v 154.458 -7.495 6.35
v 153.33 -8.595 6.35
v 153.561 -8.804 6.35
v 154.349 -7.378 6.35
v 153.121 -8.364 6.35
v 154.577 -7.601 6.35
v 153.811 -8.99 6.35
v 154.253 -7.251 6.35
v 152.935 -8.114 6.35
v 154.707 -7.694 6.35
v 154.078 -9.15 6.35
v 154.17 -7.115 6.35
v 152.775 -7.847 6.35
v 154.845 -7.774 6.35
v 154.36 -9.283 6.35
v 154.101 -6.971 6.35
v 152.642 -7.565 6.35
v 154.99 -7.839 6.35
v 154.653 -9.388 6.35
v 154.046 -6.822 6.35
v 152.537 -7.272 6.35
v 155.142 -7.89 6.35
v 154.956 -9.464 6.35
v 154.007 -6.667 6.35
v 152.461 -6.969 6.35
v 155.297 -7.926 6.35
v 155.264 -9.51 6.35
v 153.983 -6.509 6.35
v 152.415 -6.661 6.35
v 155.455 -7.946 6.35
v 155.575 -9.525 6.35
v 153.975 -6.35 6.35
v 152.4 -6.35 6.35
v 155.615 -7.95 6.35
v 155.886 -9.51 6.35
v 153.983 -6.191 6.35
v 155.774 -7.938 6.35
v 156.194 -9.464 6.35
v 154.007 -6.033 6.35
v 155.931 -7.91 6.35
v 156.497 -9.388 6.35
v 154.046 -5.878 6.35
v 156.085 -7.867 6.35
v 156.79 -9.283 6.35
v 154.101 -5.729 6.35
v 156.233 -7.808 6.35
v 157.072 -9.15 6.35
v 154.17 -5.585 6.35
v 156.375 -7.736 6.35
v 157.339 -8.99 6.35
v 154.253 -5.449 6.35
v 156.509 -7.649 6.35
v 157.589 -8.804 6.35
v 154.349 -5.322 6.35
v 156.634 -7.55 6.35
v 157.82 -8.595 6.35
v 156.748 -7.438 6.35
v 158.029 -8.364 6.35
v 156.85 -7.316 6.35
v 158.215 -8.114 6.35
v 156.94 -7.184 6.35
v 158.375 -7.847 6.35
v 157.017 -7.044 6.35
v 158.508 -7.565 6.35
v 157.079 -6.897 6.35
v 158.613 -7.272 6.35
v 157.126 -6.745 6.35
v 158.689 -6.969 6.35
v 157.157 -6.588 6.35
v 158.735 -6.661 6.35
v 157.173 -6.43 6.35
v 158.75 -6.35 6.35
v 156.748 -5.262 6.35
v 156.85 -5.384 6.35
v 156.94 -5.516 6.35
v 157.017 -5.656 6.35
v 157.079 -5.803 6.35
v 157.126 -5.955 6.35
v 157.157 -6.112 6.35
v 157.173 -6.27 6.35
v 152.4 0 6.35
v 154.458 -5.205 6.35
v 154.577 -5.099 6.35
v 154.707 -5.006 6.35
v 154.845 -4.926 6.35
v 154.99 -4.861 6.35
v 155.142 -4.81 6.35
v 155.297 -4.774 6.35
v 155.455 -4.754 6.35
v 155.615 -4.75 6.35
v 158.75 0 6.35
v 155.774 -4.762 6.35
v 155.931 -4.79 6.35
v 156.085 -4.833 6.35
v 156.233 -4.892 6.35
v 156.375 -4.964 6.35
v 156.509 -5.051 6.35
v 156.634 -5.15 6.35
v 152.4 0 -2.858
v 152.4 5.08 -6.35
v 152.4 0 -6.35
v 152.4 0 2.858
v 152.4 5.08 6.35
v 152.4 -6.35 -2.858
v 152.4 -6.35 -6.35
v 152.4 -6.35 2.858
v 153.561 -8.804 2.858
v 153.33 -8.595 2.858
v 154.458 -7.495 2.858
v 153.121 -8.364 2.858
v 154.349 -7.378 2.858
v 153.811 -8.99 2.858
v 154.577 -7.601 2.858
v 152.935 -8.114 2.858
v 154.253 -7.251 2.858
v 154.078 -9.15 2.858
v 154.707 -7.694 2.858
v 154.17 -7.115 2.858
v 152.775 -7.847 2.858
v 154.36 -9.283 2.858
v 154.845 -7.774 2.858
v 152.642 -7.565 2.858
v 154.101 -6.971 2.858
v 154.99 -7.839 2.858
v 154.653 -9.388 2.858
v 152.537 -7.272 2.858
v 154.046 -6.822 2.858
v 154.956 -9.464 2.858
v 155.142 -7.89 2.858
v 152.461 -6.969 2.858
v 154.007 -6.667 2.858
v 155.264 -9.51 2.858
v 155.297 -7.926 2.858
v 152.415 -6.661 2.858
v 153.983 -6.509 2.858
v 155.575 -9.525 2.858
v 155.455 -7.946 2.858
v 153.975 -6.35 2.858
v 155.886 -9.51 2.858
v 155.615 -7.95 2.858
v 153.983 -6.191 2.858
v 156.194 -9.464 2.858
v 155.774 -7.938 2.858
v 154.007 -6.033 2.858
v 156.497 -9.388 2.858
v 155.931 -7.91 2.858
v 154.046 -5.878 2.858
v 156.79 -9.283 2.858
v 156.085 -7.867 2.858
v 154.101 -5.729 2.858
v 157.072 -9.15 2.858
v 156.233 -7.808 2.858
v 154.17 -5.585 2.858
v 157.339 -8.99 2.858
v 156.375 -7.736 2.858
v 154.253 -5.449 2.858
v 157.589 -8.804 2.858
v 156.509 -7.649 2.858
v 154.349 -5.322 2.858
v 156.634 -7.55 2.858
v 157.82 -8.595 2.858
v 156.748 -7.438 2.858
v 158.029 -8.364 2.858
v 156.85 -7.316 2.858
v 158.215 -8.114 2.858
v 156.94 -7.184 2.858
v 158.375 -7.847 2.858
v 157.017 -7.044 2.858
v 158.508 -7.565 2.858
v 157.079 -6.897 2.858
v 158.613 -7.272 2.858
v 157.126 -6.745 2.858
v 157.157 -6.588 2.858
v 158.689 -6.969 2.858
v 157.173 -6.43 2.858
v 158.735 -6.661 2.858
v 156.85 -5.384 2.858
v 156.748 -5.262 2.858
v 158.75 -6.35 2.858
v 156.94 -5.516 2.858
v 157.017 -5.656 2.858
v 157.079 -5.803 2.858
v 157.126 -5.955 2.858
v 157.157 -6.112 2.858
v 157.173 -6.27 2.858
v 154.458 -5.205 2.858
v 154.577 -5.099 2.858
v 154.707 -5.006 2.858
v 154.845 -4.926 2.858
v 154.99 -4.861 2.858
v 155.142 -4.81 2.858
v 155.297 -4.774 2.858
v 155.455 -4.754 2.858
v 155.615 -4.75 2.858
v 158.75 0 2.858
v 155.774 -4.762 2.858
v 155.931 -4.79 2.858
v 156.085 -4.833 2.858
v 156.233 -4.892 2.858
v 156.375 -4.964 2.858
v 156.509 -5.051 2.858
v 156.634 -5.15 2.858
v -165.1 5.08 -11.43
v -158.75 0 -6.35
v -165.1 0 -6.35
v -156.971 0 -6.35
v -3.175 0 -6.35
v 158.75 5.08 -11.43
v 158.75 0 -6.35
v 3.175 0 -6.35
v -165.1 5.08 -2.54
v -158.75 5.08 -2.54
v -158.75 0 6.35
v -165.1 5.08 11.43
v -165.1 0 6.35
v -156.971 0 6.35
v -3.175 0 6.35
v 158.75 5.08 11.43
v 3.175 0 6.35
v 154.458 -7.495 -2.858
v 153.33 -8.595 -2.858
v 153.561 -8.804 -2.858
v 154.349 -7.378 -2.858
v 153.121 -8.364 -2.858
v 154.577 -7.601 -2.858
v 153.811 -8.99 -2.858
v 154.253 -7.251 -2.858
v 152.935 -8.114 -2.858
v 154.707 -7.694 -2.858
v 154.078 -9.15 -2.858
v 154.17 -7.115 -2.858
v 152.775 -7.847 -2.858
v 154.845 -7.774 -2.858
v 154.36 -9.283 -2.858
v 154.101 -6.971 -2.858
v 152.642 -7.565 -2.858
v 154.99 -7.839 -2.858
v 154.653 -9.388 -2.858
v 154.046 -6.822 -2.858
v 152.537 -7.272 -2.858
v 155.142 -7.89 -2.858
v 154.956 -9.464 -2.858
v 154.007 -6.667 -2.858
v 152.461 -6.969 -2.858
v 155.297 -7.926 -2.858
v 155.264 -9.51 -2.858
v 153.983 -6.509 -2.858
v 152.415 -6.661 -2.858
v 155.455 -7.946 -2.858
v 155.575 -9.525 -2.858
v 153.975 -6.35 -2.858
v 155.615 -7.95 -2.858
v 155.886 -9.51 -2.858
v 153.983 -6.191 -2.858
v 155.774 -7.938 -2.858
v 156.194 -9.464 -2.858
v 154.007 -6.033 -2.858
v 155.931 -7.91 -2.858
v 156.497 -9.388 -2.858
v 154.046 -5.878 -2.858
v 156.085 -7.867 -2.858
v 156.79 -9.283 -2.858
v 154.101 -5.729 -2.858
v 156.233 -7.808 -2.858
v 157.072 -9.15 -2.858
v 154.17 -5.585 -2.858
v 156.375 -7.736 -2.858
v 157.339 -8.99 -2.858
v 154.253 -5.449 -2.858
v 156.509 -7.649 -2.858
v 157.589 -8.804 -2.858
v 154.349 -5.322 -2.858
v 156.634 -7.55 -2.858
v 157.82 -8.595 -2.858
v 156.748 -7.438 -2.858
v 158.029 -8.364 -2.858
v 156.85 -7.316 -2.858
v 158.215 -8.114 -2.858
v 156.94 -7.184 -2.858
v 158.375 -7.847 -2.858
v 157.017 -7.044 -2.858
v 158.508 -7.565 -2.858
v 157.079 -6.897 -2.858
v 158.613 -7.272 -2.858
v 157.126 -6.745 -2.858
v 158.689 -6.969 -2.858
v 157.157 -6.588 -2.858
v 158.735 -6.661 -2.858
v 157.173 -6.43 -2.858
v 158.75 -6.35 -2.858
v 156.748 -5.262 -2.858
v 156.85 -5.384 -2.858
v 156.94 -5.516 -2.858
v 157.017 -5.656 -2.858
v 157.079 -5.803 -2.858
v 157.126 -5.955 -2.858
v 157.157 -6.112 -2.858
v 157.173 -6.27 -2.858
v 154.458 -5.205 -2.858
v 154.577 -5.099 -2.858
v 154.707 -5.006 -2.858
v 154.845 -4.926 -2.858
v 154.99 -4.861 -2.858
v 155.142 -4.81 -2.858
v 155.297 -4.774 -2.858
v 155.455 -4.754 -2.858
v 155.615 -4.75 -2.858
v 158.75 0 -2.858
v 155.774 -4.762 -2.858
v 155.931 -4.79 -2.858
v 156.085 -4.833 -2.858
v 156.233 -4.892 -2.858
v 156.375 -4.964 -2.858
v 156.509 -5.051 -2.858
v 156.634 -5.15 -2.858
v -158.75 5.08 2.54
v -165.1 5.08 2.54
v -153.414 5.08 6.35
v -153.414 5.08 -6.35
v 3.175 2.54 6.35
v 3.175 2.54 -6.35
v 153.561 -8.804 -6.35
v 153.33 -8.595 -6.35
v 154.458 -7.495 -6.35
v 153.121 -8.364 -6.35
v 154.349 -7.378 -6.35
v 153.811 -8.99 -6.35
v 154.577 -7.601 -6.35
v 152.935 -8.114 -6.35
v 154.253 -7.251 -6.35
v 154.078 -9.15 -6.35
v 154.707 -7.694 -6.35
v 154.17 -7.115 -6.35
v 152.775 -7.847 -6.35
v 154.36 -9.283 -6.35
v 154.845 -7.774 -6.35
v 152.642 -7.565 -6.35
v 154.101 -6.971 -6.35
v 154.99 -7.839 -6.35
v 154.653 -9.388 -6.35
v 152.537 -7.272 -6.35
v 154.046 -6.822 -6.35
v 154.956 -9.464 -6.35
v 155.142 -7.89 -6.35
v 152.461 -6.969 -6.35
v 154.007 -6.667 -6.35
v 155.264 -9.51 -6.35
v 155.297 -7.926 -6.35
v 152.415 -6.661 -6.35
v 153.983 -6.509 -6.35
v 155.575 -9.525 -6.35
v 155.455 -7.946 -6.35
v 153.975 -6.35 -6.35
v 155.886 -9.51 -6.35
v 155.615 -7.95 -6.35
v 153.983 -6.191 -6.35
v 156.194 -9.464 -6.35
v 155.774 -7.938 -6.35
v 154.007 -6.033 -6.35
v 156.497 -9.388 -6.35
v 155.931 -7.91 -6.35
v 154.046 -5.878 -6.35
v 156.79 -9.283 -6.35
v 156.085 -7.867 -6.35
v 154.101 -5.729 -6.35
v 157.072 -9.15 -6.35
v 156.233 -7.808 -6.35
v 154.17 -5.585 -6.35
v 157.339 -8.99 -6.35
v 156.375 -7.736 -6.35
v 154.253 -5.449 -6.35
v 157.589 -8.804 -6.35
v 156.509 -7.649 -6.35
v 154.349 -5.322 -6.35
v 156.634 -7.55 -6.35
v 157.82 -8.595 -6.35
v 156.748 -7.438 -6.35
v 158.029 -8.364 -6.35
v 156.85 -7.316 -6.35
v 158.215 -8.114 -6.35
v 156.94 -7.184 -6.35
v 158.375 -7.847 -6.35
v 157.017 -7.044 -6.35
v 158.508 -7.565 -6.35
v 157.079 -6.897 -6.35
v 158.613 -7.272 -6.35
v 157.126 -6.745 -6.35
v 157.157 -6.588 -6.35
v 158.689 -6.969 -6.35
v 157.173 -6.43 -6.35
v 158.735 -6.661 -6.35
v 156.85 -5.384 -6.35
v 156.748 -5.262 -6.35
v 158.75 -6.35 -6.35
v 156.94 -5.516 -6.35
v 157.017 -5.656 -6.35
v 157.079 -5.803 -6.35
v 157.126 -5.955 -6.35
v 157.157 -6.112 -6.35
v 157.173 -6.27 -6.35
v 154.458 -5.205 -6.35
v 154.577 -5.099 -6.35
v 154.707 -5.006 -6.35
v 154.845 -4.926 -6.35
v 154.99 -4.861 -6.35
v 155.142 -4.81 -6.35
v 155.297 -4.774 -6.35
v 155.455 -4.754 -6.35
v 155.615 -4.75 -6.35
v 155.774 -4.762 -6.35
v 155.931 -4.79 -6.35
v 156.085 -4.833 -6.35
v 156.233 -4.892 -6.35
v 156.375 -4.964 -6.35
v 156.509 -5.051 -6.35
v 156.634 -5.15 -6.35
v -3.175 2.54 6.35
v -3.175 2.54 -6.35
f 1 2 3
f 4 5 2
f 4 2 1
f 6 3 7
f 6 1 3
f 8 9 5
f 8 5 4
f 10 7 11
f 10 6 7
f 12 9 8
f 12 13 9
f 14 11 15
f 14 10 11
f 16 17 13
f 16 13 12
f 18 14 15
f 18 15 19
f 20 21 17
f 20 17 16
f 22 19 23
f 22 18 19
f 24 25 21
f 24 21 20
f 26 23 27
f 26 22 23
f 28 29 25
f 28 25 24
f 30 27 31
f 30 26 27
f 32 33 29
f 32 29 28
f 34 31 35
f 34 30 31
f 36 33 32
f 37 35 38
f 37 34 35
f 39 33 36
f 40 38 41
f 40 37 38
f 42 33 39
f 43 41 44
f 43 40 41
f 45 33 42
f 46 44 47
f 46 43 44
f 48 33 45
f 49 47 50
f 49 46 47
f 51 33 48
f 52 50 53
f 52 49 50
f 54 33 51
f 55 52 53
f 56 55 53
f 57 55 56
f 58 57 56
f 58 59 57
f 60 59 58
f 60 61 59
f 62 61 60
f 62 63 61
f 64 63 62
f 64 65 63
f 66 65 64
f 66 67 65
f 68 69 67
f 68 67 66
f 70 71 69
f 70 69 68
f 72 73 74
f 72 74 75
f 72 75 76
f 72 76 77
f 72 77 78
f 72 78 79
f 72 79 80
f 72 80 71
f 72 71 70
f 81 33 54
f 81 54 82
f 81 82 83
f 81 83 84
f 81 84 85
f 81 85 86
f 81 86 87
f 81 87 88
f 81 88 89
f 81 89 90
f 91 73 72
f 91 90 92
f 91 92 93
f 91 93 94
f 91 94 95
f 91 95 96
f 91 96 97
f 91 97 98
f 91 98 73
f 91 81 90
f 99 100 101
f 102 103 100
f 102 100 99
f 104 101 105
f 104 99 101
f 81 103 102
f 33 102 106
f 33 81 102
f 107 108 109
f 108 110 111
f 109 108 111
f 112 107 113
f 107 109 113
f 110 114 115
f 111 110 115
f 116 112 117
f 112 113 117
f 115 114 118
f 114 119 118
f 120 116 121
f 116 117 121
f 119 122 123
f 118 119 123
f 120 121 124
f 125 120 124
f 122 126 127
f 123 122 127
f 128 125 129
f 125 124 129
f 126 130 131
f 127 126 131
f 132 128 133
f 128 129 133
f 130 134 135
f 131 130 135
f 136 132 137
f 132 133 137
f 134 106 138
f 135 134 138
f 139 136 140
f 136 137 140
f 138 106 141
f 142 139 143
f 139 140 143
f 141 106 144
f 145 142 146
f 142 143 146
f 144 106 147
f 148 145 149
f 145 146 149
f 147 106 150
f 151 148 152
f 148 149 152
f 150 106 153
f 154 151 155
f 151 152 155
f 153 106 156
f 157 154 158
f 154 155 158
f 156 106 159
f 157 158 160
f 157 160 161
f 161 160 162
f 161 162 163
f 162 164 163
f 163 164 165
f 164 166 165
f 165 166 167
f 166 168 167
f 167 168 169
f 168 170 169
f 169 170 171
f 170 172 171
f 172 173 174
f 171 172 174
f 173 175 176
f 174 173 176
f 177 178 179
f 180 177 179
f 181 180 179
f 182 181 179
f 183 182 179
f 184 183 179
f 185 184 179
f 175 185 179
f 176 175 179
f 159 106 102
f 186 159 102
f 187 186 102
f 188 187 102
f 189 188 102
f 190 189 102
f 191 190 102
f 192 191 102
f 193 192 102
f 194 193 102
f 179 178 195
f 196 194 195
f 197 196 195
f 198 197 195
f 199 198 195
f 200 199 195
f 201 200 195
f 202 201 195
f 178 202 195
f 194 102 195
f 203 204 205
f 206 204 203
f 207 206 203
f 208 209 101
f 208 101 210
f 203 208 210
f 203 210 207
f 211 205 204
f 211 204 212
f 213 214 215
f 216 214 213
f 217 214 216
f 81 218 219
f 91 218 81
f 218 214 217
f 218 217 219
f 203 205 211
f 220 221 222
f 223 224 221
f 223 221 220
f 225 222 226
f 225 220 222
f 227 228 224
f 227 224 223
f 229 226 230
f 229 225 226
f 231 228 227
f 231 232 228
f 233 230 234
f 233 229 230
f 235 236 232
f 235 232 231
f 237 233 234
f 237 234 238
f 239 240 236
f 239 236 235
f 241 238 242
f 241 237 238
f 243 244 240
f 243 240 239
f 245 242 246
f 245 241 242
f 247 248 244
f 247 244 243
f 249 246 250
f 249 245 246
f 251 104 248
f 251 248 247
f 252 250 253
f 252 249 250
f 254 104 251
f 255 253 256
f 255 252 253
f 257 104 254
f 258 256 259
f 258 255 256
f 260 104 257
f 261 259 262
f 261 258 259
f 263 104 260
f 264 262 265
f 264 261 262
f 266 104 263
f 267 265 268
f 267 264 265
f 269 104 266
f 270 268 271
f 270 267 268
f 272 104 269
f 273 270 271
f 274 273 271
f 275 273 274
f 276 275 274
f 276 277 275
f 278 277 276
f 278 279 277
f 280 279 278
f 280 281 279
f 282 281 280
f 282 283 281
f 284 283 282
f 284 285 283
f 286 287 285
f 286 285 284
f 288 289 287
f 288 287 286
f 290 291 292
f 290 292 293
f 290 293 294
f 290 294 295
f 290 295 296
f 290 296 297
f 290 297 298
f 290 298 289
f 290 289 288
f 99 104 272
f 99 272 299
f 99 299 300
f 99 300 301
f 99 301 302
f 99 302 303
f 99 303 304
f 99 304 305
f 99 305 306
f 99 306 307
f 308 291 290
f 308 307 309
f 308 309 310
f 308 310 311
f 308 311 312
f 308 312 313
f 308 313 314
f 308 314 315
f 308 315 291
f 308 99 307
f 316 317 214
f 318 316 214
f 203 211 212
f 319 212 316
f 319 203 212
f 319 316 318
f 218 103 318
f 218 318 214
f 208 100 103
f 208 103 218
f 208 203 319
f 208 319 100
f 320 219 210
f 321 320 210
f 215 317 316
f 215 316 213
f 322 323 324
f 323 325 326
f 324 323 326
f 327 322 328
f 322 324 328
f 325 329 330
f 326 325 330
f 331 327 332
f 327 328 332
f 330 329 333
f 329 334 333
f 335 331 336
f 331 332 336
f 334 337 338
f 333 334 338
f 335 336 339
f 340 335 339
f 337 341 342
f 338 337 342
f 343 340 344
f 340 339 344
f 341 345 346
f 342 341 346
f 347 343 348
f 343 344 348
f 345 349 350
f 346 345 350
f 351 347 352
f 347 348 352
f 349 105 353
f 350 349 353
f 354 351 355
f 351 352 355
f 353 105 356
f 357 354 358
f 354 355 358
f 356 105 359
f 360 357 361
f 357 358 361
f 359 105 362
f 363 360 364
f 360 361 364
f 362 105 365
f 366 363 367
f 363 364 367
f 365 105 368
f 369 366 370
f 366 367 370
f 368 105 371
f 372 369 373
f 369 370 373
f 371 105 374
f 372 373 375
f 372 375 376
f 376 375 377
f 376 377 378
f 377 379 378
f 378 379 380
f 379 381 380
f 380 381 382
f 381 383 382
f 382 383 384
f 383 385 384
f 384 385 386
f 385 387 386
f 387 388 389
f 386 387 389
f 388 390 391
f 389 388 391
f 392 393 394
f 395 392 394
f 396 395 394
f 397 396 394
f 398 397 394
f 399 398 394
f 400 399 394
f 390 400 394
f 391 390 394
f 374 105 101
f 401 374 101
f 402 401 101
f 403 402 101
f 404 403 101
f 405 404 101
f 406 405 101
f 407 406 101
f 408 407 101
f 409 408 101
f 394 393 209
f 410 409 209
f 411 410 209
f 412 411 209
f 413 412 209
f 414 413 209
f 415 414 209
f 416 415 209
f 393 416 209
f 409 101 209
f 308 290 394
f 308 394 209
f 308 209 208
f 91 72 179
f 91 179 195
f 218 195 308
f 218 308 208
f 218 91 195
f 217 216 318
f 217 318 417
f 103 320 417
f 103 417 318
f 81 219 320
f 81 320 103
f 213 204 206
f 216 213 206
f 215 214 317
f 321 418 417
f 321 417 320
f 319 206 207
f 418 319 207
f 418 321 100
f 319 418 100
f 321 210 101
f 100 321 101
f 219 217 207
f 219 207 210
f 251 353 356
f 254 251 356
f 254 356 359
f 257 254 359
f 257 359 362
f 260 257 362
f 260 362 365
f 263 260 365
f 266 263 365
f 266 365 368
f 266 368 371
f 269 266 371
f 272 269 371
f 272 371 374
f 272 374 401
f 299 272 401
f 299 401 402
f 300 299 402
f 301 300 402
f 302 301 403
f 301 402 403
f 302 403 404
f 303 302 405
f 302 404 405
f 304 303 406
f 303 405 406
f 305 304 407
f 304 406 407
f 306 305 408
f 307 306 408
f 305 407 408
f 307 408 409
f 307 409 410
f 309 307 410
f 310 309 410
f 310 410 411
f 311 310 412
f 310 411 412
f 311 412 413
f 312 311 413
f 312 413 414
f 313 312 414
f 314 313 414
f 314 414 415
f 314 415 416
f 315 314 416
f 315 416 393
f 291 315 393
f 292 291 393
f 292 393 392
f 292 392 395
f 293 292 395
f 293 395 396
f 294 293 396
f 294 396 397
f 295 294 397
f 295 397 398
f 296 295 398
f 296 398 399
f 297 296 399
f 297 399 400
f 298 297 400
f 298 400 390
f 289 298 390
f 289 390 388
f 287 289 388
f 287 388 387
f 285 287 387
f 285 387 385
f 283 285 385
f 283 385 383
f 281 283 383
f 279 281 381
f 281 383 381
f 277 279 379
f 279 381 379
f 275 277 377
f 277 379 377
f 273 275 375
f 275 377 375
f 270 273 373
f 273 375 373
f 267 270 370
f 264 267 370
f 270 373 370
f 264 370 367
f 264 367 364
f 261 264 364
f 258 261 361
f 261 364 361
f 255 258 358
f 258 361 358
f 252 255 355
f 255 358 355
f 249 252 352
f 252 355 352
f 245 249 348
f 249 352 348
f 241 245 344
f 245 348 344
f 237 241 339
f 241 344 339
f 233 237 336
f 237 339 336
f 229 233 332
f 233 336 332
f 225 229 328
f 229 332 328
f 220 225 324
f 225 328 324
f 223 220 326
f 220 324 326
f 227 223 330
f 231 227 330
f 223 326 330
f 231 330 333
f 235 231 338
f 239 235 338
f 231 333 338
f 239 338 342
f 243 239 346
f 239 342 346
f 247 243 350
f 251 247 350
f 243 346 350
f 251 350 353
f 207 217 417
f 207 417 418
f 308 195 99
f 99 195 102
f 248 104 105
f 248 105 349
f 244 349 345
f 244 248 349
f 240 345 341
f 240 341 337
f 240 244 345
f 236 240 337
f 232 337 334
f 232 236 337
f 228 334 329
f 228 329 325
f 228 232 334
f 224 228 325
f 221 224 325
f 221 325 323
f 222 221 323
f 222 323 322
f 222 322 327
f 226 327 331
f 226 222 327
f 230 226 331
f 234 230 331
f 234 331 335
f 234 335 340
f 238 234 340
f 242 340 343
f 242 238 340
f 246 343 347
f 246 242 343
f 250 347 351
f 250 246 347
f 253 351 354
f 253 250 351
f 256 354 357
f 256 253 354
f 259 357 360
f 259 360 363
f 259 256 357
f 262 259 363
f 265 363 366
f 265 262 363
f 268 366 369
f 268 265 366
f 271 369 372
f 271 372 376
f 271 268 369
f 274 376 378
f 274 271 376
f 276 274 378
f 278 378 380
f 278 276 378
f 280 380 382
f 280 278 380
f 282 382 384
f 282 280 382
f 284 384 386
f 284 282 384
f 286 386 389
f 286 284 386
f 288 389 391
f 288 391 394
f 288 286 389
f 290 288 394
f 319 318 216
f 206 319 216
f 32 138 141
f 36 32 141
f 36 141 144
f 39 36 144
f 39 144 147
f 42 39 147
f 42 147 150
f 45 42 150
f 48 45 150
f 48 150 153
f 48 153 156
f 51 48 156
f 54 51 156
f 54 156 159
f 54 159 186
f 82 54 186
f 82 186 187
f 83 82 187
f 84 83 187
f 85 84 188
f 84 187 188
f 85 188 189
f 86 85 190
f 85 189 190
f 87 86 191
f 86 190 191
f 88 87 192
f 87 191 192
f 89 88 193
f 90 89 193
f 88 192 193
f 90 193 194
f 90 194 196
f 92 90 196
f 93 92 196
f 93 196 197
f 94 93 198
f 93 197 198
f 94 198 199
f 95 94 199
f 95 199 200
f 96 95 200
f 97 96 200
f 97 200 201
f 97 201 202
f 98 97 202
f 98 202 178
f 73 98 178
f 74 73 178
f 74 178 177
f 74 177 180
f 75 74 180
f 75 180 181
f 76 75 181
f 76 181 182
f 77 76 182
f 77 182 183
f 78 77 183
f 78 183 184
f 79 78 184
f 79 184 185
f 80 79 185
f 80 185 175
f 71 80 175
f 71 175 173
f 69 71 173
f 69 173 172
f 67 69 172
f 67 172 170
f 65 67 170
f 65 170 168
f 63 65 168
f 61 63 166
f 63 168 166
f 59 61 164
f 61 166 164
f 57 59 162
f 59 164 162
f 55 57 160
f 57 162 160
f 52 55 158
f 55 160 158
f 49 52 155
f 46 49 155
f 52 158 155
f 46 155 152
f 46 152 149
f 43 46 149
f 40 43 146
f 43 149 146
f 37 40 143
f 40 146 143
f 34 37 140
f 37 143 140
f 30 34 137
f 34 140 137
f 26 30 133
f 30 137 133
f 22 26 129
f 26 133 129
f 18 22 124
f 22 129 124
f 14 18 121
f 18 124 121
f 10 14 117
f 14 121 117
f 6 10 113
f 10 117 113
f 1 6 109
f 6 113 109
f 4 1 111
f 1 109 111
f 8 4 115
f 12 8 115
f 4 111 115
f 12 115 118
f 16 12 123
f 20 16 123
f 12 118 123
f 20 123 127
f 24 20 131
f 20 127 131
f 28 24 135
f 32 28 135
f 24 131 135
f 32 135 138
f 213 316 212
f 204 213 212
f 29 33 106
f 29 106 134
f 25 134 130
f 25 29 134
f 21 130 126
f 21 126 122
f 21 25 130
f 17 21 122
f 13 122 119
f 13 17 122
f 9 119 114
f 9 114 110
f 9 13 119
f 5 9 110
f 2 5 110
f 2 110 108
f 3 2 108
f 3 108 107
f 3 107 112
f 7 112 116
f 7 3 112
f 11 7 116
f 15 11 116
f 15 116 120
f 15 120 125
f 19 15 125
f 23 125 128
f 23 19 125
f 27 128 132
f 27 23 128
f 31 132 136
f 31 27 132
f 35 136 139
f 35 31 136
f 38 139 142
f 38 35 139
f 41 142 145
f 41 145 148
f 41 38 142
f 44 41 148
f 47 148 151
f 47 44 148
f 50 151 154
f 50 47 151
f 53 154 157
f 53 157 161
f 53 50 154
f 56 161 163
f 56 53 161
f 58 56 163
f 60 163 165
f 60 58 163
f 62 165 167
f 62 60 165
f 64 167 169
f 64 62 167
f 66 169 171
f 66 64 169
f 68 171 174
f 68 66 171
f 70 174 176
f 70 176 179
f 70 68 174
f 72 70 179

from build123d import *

# Parameters (mm, degrees)
SKETCH2_W            = 323.85
SKETCH2_H            = 22.86
SKETCH2_W_2          = 304.8
SKETCH2_H_2          = 12.7
BOSS_EXTRUDE1_DEPTH  = 5.08
CUT_EXTRUDE1_DEPTH   = 6.35
SKETCH4_W            = 6.35
SKETCH4_H            = 12.7
BOSS_EXTRUDE2_DEPTH  = 2.54
CUT_EXTRUDE3_DEPTH   = 325.091459005
CHAMFER5_SIZE        = 6.5287398
CHAMFER5_SIZE_2      = 4.571472823
BOSS_EXTRUDE4_DEPTH  = 6.35
CUT_EXTRUDE5_DEPTH   = 2.8575
M3_CLEARANCE_HOLE1_D = 3.2


with BuildPart() as part:
    # Sketch2 → Boss-Extrude1 (new body)
    with BuildSketch(Plane(origin=(0, 0, 0), x_dir=(1, 0, 0), z_dir=(0, 1, 0))):
        with Locations((-3.175, 0)):
            Rectangle(SKETCH2_W, SKETCH2_H)
        Rectangle(SKETCH2_W_2, SKETCH2_H_2, mode=Mode.SUBTRACT)
    extrude(amount=BOSS_EXTRUDE1_DEPTH)

    # Sketch3 → Cut-Extrude1 (cut)
    with BuildSketch(Plane.ZY.offset(165.1)):
        Polygon((-2.54, 5.08), (2.54, 5.08), (6.35, 0), (-6.35, 0), align=None)
    extrude(amount=-CUT_EXTRUDE1_DEPTH, mode=Mode.SUBTRACT)

    # Sketch4 → Boss-Extrude2 (add)
    with BuildSketch(Plane(origin=(0, 0, 0), x_dir=(1, 0, 0), z_dir=(0, 1, 0))):
        Rectangle(SKETCH4_W, SKETCH4_H)
    extrude(amount=BOSS_EXTRUDE2_DEPTH)

    # Sketch6 → Cut-Extrude3 (cut, through all)
    with BuildSketch(Plane(origin=(158.75, 0, 0), x_dir=(0, 0, -1), z_dir=(1, 0, 0))):
        Polygon((-11.43, 5.08), (-6.35, 0), (-11.43, 0), align=None)
        Polygon((11.43, 0), (6.35, 0), (11.43, 5.08), align=None)
    extrude(amount=-CUT_EXTRUDE3_DEPTH, mode=Mode.SUBTRACT)

    # Chamfer5
    # the kernel refuses this chamfer: 6.5287398, 4.571472823 mm, written as the material it takes off along each edge
    with BuildSketch(Plane(origin=(-152.4, 0, -6.35), x_dir=(0.02220967419845904, 0.9997533347641299, 0), z_dir=(0, 0, 1))) as chamfer5_piece_1:
        Polygon((CHAMFER5_SIZE * 0.999753334764, CHAMFER5_SIZE * 0.0222096741985), (-CHAMFER5_SIZE_2 * 0.0222096741983, CHAMFER5_SIZE_2 * 0.999753334758), (0, 0), align=None)
    extrude(amount=12.7, mode=Mode.SUBTRACT)

    # Sketch8 → Boss-Extrude4 (add, symmetric)
    with BuildSketch(Plane.XY):
        with BuildLine():
            Line((152.4, 0), (152.4, -6.35))
            ThreePointArc((152.4, -6.35), (155.575, -9.525), (158.75, -6.35))
            Line((158.75, -6.35), (158.75, 0))
            Line((158.75, 0), (152.4, 0))
        make_face()
    extrude(amount=BOSS_EXTRUDE4_DEPTH, both=True)

    # Sketch8<2> → Cut-Extrude5 (cut, symmetric)
    with BuildSketch(Plane.XY):
        with BuildLine():
            Line((152.4, 0), (152.4, -6.35))
            ThreePointArc((152.4, -6.35), (155.575, -9.525), (158.75, -6.35))
            Line((158.75, -6.35), (158.75, 0))
            Line((158.75, 0), (152.4, 0))
        make_face()
    extrude(amount=CUT_EXTRUDE5_DEPTH, both=True, mode=Mode.SUBTRACT)

    # M3 Clearance Hole1 (through all)
    with Locations(Plane.XY.offset(6.35)):
        with Locations((155.575, -6.35)):
            Hole(M3_CLEARANCE_HOLE1_D / 2)


solid = part.part
